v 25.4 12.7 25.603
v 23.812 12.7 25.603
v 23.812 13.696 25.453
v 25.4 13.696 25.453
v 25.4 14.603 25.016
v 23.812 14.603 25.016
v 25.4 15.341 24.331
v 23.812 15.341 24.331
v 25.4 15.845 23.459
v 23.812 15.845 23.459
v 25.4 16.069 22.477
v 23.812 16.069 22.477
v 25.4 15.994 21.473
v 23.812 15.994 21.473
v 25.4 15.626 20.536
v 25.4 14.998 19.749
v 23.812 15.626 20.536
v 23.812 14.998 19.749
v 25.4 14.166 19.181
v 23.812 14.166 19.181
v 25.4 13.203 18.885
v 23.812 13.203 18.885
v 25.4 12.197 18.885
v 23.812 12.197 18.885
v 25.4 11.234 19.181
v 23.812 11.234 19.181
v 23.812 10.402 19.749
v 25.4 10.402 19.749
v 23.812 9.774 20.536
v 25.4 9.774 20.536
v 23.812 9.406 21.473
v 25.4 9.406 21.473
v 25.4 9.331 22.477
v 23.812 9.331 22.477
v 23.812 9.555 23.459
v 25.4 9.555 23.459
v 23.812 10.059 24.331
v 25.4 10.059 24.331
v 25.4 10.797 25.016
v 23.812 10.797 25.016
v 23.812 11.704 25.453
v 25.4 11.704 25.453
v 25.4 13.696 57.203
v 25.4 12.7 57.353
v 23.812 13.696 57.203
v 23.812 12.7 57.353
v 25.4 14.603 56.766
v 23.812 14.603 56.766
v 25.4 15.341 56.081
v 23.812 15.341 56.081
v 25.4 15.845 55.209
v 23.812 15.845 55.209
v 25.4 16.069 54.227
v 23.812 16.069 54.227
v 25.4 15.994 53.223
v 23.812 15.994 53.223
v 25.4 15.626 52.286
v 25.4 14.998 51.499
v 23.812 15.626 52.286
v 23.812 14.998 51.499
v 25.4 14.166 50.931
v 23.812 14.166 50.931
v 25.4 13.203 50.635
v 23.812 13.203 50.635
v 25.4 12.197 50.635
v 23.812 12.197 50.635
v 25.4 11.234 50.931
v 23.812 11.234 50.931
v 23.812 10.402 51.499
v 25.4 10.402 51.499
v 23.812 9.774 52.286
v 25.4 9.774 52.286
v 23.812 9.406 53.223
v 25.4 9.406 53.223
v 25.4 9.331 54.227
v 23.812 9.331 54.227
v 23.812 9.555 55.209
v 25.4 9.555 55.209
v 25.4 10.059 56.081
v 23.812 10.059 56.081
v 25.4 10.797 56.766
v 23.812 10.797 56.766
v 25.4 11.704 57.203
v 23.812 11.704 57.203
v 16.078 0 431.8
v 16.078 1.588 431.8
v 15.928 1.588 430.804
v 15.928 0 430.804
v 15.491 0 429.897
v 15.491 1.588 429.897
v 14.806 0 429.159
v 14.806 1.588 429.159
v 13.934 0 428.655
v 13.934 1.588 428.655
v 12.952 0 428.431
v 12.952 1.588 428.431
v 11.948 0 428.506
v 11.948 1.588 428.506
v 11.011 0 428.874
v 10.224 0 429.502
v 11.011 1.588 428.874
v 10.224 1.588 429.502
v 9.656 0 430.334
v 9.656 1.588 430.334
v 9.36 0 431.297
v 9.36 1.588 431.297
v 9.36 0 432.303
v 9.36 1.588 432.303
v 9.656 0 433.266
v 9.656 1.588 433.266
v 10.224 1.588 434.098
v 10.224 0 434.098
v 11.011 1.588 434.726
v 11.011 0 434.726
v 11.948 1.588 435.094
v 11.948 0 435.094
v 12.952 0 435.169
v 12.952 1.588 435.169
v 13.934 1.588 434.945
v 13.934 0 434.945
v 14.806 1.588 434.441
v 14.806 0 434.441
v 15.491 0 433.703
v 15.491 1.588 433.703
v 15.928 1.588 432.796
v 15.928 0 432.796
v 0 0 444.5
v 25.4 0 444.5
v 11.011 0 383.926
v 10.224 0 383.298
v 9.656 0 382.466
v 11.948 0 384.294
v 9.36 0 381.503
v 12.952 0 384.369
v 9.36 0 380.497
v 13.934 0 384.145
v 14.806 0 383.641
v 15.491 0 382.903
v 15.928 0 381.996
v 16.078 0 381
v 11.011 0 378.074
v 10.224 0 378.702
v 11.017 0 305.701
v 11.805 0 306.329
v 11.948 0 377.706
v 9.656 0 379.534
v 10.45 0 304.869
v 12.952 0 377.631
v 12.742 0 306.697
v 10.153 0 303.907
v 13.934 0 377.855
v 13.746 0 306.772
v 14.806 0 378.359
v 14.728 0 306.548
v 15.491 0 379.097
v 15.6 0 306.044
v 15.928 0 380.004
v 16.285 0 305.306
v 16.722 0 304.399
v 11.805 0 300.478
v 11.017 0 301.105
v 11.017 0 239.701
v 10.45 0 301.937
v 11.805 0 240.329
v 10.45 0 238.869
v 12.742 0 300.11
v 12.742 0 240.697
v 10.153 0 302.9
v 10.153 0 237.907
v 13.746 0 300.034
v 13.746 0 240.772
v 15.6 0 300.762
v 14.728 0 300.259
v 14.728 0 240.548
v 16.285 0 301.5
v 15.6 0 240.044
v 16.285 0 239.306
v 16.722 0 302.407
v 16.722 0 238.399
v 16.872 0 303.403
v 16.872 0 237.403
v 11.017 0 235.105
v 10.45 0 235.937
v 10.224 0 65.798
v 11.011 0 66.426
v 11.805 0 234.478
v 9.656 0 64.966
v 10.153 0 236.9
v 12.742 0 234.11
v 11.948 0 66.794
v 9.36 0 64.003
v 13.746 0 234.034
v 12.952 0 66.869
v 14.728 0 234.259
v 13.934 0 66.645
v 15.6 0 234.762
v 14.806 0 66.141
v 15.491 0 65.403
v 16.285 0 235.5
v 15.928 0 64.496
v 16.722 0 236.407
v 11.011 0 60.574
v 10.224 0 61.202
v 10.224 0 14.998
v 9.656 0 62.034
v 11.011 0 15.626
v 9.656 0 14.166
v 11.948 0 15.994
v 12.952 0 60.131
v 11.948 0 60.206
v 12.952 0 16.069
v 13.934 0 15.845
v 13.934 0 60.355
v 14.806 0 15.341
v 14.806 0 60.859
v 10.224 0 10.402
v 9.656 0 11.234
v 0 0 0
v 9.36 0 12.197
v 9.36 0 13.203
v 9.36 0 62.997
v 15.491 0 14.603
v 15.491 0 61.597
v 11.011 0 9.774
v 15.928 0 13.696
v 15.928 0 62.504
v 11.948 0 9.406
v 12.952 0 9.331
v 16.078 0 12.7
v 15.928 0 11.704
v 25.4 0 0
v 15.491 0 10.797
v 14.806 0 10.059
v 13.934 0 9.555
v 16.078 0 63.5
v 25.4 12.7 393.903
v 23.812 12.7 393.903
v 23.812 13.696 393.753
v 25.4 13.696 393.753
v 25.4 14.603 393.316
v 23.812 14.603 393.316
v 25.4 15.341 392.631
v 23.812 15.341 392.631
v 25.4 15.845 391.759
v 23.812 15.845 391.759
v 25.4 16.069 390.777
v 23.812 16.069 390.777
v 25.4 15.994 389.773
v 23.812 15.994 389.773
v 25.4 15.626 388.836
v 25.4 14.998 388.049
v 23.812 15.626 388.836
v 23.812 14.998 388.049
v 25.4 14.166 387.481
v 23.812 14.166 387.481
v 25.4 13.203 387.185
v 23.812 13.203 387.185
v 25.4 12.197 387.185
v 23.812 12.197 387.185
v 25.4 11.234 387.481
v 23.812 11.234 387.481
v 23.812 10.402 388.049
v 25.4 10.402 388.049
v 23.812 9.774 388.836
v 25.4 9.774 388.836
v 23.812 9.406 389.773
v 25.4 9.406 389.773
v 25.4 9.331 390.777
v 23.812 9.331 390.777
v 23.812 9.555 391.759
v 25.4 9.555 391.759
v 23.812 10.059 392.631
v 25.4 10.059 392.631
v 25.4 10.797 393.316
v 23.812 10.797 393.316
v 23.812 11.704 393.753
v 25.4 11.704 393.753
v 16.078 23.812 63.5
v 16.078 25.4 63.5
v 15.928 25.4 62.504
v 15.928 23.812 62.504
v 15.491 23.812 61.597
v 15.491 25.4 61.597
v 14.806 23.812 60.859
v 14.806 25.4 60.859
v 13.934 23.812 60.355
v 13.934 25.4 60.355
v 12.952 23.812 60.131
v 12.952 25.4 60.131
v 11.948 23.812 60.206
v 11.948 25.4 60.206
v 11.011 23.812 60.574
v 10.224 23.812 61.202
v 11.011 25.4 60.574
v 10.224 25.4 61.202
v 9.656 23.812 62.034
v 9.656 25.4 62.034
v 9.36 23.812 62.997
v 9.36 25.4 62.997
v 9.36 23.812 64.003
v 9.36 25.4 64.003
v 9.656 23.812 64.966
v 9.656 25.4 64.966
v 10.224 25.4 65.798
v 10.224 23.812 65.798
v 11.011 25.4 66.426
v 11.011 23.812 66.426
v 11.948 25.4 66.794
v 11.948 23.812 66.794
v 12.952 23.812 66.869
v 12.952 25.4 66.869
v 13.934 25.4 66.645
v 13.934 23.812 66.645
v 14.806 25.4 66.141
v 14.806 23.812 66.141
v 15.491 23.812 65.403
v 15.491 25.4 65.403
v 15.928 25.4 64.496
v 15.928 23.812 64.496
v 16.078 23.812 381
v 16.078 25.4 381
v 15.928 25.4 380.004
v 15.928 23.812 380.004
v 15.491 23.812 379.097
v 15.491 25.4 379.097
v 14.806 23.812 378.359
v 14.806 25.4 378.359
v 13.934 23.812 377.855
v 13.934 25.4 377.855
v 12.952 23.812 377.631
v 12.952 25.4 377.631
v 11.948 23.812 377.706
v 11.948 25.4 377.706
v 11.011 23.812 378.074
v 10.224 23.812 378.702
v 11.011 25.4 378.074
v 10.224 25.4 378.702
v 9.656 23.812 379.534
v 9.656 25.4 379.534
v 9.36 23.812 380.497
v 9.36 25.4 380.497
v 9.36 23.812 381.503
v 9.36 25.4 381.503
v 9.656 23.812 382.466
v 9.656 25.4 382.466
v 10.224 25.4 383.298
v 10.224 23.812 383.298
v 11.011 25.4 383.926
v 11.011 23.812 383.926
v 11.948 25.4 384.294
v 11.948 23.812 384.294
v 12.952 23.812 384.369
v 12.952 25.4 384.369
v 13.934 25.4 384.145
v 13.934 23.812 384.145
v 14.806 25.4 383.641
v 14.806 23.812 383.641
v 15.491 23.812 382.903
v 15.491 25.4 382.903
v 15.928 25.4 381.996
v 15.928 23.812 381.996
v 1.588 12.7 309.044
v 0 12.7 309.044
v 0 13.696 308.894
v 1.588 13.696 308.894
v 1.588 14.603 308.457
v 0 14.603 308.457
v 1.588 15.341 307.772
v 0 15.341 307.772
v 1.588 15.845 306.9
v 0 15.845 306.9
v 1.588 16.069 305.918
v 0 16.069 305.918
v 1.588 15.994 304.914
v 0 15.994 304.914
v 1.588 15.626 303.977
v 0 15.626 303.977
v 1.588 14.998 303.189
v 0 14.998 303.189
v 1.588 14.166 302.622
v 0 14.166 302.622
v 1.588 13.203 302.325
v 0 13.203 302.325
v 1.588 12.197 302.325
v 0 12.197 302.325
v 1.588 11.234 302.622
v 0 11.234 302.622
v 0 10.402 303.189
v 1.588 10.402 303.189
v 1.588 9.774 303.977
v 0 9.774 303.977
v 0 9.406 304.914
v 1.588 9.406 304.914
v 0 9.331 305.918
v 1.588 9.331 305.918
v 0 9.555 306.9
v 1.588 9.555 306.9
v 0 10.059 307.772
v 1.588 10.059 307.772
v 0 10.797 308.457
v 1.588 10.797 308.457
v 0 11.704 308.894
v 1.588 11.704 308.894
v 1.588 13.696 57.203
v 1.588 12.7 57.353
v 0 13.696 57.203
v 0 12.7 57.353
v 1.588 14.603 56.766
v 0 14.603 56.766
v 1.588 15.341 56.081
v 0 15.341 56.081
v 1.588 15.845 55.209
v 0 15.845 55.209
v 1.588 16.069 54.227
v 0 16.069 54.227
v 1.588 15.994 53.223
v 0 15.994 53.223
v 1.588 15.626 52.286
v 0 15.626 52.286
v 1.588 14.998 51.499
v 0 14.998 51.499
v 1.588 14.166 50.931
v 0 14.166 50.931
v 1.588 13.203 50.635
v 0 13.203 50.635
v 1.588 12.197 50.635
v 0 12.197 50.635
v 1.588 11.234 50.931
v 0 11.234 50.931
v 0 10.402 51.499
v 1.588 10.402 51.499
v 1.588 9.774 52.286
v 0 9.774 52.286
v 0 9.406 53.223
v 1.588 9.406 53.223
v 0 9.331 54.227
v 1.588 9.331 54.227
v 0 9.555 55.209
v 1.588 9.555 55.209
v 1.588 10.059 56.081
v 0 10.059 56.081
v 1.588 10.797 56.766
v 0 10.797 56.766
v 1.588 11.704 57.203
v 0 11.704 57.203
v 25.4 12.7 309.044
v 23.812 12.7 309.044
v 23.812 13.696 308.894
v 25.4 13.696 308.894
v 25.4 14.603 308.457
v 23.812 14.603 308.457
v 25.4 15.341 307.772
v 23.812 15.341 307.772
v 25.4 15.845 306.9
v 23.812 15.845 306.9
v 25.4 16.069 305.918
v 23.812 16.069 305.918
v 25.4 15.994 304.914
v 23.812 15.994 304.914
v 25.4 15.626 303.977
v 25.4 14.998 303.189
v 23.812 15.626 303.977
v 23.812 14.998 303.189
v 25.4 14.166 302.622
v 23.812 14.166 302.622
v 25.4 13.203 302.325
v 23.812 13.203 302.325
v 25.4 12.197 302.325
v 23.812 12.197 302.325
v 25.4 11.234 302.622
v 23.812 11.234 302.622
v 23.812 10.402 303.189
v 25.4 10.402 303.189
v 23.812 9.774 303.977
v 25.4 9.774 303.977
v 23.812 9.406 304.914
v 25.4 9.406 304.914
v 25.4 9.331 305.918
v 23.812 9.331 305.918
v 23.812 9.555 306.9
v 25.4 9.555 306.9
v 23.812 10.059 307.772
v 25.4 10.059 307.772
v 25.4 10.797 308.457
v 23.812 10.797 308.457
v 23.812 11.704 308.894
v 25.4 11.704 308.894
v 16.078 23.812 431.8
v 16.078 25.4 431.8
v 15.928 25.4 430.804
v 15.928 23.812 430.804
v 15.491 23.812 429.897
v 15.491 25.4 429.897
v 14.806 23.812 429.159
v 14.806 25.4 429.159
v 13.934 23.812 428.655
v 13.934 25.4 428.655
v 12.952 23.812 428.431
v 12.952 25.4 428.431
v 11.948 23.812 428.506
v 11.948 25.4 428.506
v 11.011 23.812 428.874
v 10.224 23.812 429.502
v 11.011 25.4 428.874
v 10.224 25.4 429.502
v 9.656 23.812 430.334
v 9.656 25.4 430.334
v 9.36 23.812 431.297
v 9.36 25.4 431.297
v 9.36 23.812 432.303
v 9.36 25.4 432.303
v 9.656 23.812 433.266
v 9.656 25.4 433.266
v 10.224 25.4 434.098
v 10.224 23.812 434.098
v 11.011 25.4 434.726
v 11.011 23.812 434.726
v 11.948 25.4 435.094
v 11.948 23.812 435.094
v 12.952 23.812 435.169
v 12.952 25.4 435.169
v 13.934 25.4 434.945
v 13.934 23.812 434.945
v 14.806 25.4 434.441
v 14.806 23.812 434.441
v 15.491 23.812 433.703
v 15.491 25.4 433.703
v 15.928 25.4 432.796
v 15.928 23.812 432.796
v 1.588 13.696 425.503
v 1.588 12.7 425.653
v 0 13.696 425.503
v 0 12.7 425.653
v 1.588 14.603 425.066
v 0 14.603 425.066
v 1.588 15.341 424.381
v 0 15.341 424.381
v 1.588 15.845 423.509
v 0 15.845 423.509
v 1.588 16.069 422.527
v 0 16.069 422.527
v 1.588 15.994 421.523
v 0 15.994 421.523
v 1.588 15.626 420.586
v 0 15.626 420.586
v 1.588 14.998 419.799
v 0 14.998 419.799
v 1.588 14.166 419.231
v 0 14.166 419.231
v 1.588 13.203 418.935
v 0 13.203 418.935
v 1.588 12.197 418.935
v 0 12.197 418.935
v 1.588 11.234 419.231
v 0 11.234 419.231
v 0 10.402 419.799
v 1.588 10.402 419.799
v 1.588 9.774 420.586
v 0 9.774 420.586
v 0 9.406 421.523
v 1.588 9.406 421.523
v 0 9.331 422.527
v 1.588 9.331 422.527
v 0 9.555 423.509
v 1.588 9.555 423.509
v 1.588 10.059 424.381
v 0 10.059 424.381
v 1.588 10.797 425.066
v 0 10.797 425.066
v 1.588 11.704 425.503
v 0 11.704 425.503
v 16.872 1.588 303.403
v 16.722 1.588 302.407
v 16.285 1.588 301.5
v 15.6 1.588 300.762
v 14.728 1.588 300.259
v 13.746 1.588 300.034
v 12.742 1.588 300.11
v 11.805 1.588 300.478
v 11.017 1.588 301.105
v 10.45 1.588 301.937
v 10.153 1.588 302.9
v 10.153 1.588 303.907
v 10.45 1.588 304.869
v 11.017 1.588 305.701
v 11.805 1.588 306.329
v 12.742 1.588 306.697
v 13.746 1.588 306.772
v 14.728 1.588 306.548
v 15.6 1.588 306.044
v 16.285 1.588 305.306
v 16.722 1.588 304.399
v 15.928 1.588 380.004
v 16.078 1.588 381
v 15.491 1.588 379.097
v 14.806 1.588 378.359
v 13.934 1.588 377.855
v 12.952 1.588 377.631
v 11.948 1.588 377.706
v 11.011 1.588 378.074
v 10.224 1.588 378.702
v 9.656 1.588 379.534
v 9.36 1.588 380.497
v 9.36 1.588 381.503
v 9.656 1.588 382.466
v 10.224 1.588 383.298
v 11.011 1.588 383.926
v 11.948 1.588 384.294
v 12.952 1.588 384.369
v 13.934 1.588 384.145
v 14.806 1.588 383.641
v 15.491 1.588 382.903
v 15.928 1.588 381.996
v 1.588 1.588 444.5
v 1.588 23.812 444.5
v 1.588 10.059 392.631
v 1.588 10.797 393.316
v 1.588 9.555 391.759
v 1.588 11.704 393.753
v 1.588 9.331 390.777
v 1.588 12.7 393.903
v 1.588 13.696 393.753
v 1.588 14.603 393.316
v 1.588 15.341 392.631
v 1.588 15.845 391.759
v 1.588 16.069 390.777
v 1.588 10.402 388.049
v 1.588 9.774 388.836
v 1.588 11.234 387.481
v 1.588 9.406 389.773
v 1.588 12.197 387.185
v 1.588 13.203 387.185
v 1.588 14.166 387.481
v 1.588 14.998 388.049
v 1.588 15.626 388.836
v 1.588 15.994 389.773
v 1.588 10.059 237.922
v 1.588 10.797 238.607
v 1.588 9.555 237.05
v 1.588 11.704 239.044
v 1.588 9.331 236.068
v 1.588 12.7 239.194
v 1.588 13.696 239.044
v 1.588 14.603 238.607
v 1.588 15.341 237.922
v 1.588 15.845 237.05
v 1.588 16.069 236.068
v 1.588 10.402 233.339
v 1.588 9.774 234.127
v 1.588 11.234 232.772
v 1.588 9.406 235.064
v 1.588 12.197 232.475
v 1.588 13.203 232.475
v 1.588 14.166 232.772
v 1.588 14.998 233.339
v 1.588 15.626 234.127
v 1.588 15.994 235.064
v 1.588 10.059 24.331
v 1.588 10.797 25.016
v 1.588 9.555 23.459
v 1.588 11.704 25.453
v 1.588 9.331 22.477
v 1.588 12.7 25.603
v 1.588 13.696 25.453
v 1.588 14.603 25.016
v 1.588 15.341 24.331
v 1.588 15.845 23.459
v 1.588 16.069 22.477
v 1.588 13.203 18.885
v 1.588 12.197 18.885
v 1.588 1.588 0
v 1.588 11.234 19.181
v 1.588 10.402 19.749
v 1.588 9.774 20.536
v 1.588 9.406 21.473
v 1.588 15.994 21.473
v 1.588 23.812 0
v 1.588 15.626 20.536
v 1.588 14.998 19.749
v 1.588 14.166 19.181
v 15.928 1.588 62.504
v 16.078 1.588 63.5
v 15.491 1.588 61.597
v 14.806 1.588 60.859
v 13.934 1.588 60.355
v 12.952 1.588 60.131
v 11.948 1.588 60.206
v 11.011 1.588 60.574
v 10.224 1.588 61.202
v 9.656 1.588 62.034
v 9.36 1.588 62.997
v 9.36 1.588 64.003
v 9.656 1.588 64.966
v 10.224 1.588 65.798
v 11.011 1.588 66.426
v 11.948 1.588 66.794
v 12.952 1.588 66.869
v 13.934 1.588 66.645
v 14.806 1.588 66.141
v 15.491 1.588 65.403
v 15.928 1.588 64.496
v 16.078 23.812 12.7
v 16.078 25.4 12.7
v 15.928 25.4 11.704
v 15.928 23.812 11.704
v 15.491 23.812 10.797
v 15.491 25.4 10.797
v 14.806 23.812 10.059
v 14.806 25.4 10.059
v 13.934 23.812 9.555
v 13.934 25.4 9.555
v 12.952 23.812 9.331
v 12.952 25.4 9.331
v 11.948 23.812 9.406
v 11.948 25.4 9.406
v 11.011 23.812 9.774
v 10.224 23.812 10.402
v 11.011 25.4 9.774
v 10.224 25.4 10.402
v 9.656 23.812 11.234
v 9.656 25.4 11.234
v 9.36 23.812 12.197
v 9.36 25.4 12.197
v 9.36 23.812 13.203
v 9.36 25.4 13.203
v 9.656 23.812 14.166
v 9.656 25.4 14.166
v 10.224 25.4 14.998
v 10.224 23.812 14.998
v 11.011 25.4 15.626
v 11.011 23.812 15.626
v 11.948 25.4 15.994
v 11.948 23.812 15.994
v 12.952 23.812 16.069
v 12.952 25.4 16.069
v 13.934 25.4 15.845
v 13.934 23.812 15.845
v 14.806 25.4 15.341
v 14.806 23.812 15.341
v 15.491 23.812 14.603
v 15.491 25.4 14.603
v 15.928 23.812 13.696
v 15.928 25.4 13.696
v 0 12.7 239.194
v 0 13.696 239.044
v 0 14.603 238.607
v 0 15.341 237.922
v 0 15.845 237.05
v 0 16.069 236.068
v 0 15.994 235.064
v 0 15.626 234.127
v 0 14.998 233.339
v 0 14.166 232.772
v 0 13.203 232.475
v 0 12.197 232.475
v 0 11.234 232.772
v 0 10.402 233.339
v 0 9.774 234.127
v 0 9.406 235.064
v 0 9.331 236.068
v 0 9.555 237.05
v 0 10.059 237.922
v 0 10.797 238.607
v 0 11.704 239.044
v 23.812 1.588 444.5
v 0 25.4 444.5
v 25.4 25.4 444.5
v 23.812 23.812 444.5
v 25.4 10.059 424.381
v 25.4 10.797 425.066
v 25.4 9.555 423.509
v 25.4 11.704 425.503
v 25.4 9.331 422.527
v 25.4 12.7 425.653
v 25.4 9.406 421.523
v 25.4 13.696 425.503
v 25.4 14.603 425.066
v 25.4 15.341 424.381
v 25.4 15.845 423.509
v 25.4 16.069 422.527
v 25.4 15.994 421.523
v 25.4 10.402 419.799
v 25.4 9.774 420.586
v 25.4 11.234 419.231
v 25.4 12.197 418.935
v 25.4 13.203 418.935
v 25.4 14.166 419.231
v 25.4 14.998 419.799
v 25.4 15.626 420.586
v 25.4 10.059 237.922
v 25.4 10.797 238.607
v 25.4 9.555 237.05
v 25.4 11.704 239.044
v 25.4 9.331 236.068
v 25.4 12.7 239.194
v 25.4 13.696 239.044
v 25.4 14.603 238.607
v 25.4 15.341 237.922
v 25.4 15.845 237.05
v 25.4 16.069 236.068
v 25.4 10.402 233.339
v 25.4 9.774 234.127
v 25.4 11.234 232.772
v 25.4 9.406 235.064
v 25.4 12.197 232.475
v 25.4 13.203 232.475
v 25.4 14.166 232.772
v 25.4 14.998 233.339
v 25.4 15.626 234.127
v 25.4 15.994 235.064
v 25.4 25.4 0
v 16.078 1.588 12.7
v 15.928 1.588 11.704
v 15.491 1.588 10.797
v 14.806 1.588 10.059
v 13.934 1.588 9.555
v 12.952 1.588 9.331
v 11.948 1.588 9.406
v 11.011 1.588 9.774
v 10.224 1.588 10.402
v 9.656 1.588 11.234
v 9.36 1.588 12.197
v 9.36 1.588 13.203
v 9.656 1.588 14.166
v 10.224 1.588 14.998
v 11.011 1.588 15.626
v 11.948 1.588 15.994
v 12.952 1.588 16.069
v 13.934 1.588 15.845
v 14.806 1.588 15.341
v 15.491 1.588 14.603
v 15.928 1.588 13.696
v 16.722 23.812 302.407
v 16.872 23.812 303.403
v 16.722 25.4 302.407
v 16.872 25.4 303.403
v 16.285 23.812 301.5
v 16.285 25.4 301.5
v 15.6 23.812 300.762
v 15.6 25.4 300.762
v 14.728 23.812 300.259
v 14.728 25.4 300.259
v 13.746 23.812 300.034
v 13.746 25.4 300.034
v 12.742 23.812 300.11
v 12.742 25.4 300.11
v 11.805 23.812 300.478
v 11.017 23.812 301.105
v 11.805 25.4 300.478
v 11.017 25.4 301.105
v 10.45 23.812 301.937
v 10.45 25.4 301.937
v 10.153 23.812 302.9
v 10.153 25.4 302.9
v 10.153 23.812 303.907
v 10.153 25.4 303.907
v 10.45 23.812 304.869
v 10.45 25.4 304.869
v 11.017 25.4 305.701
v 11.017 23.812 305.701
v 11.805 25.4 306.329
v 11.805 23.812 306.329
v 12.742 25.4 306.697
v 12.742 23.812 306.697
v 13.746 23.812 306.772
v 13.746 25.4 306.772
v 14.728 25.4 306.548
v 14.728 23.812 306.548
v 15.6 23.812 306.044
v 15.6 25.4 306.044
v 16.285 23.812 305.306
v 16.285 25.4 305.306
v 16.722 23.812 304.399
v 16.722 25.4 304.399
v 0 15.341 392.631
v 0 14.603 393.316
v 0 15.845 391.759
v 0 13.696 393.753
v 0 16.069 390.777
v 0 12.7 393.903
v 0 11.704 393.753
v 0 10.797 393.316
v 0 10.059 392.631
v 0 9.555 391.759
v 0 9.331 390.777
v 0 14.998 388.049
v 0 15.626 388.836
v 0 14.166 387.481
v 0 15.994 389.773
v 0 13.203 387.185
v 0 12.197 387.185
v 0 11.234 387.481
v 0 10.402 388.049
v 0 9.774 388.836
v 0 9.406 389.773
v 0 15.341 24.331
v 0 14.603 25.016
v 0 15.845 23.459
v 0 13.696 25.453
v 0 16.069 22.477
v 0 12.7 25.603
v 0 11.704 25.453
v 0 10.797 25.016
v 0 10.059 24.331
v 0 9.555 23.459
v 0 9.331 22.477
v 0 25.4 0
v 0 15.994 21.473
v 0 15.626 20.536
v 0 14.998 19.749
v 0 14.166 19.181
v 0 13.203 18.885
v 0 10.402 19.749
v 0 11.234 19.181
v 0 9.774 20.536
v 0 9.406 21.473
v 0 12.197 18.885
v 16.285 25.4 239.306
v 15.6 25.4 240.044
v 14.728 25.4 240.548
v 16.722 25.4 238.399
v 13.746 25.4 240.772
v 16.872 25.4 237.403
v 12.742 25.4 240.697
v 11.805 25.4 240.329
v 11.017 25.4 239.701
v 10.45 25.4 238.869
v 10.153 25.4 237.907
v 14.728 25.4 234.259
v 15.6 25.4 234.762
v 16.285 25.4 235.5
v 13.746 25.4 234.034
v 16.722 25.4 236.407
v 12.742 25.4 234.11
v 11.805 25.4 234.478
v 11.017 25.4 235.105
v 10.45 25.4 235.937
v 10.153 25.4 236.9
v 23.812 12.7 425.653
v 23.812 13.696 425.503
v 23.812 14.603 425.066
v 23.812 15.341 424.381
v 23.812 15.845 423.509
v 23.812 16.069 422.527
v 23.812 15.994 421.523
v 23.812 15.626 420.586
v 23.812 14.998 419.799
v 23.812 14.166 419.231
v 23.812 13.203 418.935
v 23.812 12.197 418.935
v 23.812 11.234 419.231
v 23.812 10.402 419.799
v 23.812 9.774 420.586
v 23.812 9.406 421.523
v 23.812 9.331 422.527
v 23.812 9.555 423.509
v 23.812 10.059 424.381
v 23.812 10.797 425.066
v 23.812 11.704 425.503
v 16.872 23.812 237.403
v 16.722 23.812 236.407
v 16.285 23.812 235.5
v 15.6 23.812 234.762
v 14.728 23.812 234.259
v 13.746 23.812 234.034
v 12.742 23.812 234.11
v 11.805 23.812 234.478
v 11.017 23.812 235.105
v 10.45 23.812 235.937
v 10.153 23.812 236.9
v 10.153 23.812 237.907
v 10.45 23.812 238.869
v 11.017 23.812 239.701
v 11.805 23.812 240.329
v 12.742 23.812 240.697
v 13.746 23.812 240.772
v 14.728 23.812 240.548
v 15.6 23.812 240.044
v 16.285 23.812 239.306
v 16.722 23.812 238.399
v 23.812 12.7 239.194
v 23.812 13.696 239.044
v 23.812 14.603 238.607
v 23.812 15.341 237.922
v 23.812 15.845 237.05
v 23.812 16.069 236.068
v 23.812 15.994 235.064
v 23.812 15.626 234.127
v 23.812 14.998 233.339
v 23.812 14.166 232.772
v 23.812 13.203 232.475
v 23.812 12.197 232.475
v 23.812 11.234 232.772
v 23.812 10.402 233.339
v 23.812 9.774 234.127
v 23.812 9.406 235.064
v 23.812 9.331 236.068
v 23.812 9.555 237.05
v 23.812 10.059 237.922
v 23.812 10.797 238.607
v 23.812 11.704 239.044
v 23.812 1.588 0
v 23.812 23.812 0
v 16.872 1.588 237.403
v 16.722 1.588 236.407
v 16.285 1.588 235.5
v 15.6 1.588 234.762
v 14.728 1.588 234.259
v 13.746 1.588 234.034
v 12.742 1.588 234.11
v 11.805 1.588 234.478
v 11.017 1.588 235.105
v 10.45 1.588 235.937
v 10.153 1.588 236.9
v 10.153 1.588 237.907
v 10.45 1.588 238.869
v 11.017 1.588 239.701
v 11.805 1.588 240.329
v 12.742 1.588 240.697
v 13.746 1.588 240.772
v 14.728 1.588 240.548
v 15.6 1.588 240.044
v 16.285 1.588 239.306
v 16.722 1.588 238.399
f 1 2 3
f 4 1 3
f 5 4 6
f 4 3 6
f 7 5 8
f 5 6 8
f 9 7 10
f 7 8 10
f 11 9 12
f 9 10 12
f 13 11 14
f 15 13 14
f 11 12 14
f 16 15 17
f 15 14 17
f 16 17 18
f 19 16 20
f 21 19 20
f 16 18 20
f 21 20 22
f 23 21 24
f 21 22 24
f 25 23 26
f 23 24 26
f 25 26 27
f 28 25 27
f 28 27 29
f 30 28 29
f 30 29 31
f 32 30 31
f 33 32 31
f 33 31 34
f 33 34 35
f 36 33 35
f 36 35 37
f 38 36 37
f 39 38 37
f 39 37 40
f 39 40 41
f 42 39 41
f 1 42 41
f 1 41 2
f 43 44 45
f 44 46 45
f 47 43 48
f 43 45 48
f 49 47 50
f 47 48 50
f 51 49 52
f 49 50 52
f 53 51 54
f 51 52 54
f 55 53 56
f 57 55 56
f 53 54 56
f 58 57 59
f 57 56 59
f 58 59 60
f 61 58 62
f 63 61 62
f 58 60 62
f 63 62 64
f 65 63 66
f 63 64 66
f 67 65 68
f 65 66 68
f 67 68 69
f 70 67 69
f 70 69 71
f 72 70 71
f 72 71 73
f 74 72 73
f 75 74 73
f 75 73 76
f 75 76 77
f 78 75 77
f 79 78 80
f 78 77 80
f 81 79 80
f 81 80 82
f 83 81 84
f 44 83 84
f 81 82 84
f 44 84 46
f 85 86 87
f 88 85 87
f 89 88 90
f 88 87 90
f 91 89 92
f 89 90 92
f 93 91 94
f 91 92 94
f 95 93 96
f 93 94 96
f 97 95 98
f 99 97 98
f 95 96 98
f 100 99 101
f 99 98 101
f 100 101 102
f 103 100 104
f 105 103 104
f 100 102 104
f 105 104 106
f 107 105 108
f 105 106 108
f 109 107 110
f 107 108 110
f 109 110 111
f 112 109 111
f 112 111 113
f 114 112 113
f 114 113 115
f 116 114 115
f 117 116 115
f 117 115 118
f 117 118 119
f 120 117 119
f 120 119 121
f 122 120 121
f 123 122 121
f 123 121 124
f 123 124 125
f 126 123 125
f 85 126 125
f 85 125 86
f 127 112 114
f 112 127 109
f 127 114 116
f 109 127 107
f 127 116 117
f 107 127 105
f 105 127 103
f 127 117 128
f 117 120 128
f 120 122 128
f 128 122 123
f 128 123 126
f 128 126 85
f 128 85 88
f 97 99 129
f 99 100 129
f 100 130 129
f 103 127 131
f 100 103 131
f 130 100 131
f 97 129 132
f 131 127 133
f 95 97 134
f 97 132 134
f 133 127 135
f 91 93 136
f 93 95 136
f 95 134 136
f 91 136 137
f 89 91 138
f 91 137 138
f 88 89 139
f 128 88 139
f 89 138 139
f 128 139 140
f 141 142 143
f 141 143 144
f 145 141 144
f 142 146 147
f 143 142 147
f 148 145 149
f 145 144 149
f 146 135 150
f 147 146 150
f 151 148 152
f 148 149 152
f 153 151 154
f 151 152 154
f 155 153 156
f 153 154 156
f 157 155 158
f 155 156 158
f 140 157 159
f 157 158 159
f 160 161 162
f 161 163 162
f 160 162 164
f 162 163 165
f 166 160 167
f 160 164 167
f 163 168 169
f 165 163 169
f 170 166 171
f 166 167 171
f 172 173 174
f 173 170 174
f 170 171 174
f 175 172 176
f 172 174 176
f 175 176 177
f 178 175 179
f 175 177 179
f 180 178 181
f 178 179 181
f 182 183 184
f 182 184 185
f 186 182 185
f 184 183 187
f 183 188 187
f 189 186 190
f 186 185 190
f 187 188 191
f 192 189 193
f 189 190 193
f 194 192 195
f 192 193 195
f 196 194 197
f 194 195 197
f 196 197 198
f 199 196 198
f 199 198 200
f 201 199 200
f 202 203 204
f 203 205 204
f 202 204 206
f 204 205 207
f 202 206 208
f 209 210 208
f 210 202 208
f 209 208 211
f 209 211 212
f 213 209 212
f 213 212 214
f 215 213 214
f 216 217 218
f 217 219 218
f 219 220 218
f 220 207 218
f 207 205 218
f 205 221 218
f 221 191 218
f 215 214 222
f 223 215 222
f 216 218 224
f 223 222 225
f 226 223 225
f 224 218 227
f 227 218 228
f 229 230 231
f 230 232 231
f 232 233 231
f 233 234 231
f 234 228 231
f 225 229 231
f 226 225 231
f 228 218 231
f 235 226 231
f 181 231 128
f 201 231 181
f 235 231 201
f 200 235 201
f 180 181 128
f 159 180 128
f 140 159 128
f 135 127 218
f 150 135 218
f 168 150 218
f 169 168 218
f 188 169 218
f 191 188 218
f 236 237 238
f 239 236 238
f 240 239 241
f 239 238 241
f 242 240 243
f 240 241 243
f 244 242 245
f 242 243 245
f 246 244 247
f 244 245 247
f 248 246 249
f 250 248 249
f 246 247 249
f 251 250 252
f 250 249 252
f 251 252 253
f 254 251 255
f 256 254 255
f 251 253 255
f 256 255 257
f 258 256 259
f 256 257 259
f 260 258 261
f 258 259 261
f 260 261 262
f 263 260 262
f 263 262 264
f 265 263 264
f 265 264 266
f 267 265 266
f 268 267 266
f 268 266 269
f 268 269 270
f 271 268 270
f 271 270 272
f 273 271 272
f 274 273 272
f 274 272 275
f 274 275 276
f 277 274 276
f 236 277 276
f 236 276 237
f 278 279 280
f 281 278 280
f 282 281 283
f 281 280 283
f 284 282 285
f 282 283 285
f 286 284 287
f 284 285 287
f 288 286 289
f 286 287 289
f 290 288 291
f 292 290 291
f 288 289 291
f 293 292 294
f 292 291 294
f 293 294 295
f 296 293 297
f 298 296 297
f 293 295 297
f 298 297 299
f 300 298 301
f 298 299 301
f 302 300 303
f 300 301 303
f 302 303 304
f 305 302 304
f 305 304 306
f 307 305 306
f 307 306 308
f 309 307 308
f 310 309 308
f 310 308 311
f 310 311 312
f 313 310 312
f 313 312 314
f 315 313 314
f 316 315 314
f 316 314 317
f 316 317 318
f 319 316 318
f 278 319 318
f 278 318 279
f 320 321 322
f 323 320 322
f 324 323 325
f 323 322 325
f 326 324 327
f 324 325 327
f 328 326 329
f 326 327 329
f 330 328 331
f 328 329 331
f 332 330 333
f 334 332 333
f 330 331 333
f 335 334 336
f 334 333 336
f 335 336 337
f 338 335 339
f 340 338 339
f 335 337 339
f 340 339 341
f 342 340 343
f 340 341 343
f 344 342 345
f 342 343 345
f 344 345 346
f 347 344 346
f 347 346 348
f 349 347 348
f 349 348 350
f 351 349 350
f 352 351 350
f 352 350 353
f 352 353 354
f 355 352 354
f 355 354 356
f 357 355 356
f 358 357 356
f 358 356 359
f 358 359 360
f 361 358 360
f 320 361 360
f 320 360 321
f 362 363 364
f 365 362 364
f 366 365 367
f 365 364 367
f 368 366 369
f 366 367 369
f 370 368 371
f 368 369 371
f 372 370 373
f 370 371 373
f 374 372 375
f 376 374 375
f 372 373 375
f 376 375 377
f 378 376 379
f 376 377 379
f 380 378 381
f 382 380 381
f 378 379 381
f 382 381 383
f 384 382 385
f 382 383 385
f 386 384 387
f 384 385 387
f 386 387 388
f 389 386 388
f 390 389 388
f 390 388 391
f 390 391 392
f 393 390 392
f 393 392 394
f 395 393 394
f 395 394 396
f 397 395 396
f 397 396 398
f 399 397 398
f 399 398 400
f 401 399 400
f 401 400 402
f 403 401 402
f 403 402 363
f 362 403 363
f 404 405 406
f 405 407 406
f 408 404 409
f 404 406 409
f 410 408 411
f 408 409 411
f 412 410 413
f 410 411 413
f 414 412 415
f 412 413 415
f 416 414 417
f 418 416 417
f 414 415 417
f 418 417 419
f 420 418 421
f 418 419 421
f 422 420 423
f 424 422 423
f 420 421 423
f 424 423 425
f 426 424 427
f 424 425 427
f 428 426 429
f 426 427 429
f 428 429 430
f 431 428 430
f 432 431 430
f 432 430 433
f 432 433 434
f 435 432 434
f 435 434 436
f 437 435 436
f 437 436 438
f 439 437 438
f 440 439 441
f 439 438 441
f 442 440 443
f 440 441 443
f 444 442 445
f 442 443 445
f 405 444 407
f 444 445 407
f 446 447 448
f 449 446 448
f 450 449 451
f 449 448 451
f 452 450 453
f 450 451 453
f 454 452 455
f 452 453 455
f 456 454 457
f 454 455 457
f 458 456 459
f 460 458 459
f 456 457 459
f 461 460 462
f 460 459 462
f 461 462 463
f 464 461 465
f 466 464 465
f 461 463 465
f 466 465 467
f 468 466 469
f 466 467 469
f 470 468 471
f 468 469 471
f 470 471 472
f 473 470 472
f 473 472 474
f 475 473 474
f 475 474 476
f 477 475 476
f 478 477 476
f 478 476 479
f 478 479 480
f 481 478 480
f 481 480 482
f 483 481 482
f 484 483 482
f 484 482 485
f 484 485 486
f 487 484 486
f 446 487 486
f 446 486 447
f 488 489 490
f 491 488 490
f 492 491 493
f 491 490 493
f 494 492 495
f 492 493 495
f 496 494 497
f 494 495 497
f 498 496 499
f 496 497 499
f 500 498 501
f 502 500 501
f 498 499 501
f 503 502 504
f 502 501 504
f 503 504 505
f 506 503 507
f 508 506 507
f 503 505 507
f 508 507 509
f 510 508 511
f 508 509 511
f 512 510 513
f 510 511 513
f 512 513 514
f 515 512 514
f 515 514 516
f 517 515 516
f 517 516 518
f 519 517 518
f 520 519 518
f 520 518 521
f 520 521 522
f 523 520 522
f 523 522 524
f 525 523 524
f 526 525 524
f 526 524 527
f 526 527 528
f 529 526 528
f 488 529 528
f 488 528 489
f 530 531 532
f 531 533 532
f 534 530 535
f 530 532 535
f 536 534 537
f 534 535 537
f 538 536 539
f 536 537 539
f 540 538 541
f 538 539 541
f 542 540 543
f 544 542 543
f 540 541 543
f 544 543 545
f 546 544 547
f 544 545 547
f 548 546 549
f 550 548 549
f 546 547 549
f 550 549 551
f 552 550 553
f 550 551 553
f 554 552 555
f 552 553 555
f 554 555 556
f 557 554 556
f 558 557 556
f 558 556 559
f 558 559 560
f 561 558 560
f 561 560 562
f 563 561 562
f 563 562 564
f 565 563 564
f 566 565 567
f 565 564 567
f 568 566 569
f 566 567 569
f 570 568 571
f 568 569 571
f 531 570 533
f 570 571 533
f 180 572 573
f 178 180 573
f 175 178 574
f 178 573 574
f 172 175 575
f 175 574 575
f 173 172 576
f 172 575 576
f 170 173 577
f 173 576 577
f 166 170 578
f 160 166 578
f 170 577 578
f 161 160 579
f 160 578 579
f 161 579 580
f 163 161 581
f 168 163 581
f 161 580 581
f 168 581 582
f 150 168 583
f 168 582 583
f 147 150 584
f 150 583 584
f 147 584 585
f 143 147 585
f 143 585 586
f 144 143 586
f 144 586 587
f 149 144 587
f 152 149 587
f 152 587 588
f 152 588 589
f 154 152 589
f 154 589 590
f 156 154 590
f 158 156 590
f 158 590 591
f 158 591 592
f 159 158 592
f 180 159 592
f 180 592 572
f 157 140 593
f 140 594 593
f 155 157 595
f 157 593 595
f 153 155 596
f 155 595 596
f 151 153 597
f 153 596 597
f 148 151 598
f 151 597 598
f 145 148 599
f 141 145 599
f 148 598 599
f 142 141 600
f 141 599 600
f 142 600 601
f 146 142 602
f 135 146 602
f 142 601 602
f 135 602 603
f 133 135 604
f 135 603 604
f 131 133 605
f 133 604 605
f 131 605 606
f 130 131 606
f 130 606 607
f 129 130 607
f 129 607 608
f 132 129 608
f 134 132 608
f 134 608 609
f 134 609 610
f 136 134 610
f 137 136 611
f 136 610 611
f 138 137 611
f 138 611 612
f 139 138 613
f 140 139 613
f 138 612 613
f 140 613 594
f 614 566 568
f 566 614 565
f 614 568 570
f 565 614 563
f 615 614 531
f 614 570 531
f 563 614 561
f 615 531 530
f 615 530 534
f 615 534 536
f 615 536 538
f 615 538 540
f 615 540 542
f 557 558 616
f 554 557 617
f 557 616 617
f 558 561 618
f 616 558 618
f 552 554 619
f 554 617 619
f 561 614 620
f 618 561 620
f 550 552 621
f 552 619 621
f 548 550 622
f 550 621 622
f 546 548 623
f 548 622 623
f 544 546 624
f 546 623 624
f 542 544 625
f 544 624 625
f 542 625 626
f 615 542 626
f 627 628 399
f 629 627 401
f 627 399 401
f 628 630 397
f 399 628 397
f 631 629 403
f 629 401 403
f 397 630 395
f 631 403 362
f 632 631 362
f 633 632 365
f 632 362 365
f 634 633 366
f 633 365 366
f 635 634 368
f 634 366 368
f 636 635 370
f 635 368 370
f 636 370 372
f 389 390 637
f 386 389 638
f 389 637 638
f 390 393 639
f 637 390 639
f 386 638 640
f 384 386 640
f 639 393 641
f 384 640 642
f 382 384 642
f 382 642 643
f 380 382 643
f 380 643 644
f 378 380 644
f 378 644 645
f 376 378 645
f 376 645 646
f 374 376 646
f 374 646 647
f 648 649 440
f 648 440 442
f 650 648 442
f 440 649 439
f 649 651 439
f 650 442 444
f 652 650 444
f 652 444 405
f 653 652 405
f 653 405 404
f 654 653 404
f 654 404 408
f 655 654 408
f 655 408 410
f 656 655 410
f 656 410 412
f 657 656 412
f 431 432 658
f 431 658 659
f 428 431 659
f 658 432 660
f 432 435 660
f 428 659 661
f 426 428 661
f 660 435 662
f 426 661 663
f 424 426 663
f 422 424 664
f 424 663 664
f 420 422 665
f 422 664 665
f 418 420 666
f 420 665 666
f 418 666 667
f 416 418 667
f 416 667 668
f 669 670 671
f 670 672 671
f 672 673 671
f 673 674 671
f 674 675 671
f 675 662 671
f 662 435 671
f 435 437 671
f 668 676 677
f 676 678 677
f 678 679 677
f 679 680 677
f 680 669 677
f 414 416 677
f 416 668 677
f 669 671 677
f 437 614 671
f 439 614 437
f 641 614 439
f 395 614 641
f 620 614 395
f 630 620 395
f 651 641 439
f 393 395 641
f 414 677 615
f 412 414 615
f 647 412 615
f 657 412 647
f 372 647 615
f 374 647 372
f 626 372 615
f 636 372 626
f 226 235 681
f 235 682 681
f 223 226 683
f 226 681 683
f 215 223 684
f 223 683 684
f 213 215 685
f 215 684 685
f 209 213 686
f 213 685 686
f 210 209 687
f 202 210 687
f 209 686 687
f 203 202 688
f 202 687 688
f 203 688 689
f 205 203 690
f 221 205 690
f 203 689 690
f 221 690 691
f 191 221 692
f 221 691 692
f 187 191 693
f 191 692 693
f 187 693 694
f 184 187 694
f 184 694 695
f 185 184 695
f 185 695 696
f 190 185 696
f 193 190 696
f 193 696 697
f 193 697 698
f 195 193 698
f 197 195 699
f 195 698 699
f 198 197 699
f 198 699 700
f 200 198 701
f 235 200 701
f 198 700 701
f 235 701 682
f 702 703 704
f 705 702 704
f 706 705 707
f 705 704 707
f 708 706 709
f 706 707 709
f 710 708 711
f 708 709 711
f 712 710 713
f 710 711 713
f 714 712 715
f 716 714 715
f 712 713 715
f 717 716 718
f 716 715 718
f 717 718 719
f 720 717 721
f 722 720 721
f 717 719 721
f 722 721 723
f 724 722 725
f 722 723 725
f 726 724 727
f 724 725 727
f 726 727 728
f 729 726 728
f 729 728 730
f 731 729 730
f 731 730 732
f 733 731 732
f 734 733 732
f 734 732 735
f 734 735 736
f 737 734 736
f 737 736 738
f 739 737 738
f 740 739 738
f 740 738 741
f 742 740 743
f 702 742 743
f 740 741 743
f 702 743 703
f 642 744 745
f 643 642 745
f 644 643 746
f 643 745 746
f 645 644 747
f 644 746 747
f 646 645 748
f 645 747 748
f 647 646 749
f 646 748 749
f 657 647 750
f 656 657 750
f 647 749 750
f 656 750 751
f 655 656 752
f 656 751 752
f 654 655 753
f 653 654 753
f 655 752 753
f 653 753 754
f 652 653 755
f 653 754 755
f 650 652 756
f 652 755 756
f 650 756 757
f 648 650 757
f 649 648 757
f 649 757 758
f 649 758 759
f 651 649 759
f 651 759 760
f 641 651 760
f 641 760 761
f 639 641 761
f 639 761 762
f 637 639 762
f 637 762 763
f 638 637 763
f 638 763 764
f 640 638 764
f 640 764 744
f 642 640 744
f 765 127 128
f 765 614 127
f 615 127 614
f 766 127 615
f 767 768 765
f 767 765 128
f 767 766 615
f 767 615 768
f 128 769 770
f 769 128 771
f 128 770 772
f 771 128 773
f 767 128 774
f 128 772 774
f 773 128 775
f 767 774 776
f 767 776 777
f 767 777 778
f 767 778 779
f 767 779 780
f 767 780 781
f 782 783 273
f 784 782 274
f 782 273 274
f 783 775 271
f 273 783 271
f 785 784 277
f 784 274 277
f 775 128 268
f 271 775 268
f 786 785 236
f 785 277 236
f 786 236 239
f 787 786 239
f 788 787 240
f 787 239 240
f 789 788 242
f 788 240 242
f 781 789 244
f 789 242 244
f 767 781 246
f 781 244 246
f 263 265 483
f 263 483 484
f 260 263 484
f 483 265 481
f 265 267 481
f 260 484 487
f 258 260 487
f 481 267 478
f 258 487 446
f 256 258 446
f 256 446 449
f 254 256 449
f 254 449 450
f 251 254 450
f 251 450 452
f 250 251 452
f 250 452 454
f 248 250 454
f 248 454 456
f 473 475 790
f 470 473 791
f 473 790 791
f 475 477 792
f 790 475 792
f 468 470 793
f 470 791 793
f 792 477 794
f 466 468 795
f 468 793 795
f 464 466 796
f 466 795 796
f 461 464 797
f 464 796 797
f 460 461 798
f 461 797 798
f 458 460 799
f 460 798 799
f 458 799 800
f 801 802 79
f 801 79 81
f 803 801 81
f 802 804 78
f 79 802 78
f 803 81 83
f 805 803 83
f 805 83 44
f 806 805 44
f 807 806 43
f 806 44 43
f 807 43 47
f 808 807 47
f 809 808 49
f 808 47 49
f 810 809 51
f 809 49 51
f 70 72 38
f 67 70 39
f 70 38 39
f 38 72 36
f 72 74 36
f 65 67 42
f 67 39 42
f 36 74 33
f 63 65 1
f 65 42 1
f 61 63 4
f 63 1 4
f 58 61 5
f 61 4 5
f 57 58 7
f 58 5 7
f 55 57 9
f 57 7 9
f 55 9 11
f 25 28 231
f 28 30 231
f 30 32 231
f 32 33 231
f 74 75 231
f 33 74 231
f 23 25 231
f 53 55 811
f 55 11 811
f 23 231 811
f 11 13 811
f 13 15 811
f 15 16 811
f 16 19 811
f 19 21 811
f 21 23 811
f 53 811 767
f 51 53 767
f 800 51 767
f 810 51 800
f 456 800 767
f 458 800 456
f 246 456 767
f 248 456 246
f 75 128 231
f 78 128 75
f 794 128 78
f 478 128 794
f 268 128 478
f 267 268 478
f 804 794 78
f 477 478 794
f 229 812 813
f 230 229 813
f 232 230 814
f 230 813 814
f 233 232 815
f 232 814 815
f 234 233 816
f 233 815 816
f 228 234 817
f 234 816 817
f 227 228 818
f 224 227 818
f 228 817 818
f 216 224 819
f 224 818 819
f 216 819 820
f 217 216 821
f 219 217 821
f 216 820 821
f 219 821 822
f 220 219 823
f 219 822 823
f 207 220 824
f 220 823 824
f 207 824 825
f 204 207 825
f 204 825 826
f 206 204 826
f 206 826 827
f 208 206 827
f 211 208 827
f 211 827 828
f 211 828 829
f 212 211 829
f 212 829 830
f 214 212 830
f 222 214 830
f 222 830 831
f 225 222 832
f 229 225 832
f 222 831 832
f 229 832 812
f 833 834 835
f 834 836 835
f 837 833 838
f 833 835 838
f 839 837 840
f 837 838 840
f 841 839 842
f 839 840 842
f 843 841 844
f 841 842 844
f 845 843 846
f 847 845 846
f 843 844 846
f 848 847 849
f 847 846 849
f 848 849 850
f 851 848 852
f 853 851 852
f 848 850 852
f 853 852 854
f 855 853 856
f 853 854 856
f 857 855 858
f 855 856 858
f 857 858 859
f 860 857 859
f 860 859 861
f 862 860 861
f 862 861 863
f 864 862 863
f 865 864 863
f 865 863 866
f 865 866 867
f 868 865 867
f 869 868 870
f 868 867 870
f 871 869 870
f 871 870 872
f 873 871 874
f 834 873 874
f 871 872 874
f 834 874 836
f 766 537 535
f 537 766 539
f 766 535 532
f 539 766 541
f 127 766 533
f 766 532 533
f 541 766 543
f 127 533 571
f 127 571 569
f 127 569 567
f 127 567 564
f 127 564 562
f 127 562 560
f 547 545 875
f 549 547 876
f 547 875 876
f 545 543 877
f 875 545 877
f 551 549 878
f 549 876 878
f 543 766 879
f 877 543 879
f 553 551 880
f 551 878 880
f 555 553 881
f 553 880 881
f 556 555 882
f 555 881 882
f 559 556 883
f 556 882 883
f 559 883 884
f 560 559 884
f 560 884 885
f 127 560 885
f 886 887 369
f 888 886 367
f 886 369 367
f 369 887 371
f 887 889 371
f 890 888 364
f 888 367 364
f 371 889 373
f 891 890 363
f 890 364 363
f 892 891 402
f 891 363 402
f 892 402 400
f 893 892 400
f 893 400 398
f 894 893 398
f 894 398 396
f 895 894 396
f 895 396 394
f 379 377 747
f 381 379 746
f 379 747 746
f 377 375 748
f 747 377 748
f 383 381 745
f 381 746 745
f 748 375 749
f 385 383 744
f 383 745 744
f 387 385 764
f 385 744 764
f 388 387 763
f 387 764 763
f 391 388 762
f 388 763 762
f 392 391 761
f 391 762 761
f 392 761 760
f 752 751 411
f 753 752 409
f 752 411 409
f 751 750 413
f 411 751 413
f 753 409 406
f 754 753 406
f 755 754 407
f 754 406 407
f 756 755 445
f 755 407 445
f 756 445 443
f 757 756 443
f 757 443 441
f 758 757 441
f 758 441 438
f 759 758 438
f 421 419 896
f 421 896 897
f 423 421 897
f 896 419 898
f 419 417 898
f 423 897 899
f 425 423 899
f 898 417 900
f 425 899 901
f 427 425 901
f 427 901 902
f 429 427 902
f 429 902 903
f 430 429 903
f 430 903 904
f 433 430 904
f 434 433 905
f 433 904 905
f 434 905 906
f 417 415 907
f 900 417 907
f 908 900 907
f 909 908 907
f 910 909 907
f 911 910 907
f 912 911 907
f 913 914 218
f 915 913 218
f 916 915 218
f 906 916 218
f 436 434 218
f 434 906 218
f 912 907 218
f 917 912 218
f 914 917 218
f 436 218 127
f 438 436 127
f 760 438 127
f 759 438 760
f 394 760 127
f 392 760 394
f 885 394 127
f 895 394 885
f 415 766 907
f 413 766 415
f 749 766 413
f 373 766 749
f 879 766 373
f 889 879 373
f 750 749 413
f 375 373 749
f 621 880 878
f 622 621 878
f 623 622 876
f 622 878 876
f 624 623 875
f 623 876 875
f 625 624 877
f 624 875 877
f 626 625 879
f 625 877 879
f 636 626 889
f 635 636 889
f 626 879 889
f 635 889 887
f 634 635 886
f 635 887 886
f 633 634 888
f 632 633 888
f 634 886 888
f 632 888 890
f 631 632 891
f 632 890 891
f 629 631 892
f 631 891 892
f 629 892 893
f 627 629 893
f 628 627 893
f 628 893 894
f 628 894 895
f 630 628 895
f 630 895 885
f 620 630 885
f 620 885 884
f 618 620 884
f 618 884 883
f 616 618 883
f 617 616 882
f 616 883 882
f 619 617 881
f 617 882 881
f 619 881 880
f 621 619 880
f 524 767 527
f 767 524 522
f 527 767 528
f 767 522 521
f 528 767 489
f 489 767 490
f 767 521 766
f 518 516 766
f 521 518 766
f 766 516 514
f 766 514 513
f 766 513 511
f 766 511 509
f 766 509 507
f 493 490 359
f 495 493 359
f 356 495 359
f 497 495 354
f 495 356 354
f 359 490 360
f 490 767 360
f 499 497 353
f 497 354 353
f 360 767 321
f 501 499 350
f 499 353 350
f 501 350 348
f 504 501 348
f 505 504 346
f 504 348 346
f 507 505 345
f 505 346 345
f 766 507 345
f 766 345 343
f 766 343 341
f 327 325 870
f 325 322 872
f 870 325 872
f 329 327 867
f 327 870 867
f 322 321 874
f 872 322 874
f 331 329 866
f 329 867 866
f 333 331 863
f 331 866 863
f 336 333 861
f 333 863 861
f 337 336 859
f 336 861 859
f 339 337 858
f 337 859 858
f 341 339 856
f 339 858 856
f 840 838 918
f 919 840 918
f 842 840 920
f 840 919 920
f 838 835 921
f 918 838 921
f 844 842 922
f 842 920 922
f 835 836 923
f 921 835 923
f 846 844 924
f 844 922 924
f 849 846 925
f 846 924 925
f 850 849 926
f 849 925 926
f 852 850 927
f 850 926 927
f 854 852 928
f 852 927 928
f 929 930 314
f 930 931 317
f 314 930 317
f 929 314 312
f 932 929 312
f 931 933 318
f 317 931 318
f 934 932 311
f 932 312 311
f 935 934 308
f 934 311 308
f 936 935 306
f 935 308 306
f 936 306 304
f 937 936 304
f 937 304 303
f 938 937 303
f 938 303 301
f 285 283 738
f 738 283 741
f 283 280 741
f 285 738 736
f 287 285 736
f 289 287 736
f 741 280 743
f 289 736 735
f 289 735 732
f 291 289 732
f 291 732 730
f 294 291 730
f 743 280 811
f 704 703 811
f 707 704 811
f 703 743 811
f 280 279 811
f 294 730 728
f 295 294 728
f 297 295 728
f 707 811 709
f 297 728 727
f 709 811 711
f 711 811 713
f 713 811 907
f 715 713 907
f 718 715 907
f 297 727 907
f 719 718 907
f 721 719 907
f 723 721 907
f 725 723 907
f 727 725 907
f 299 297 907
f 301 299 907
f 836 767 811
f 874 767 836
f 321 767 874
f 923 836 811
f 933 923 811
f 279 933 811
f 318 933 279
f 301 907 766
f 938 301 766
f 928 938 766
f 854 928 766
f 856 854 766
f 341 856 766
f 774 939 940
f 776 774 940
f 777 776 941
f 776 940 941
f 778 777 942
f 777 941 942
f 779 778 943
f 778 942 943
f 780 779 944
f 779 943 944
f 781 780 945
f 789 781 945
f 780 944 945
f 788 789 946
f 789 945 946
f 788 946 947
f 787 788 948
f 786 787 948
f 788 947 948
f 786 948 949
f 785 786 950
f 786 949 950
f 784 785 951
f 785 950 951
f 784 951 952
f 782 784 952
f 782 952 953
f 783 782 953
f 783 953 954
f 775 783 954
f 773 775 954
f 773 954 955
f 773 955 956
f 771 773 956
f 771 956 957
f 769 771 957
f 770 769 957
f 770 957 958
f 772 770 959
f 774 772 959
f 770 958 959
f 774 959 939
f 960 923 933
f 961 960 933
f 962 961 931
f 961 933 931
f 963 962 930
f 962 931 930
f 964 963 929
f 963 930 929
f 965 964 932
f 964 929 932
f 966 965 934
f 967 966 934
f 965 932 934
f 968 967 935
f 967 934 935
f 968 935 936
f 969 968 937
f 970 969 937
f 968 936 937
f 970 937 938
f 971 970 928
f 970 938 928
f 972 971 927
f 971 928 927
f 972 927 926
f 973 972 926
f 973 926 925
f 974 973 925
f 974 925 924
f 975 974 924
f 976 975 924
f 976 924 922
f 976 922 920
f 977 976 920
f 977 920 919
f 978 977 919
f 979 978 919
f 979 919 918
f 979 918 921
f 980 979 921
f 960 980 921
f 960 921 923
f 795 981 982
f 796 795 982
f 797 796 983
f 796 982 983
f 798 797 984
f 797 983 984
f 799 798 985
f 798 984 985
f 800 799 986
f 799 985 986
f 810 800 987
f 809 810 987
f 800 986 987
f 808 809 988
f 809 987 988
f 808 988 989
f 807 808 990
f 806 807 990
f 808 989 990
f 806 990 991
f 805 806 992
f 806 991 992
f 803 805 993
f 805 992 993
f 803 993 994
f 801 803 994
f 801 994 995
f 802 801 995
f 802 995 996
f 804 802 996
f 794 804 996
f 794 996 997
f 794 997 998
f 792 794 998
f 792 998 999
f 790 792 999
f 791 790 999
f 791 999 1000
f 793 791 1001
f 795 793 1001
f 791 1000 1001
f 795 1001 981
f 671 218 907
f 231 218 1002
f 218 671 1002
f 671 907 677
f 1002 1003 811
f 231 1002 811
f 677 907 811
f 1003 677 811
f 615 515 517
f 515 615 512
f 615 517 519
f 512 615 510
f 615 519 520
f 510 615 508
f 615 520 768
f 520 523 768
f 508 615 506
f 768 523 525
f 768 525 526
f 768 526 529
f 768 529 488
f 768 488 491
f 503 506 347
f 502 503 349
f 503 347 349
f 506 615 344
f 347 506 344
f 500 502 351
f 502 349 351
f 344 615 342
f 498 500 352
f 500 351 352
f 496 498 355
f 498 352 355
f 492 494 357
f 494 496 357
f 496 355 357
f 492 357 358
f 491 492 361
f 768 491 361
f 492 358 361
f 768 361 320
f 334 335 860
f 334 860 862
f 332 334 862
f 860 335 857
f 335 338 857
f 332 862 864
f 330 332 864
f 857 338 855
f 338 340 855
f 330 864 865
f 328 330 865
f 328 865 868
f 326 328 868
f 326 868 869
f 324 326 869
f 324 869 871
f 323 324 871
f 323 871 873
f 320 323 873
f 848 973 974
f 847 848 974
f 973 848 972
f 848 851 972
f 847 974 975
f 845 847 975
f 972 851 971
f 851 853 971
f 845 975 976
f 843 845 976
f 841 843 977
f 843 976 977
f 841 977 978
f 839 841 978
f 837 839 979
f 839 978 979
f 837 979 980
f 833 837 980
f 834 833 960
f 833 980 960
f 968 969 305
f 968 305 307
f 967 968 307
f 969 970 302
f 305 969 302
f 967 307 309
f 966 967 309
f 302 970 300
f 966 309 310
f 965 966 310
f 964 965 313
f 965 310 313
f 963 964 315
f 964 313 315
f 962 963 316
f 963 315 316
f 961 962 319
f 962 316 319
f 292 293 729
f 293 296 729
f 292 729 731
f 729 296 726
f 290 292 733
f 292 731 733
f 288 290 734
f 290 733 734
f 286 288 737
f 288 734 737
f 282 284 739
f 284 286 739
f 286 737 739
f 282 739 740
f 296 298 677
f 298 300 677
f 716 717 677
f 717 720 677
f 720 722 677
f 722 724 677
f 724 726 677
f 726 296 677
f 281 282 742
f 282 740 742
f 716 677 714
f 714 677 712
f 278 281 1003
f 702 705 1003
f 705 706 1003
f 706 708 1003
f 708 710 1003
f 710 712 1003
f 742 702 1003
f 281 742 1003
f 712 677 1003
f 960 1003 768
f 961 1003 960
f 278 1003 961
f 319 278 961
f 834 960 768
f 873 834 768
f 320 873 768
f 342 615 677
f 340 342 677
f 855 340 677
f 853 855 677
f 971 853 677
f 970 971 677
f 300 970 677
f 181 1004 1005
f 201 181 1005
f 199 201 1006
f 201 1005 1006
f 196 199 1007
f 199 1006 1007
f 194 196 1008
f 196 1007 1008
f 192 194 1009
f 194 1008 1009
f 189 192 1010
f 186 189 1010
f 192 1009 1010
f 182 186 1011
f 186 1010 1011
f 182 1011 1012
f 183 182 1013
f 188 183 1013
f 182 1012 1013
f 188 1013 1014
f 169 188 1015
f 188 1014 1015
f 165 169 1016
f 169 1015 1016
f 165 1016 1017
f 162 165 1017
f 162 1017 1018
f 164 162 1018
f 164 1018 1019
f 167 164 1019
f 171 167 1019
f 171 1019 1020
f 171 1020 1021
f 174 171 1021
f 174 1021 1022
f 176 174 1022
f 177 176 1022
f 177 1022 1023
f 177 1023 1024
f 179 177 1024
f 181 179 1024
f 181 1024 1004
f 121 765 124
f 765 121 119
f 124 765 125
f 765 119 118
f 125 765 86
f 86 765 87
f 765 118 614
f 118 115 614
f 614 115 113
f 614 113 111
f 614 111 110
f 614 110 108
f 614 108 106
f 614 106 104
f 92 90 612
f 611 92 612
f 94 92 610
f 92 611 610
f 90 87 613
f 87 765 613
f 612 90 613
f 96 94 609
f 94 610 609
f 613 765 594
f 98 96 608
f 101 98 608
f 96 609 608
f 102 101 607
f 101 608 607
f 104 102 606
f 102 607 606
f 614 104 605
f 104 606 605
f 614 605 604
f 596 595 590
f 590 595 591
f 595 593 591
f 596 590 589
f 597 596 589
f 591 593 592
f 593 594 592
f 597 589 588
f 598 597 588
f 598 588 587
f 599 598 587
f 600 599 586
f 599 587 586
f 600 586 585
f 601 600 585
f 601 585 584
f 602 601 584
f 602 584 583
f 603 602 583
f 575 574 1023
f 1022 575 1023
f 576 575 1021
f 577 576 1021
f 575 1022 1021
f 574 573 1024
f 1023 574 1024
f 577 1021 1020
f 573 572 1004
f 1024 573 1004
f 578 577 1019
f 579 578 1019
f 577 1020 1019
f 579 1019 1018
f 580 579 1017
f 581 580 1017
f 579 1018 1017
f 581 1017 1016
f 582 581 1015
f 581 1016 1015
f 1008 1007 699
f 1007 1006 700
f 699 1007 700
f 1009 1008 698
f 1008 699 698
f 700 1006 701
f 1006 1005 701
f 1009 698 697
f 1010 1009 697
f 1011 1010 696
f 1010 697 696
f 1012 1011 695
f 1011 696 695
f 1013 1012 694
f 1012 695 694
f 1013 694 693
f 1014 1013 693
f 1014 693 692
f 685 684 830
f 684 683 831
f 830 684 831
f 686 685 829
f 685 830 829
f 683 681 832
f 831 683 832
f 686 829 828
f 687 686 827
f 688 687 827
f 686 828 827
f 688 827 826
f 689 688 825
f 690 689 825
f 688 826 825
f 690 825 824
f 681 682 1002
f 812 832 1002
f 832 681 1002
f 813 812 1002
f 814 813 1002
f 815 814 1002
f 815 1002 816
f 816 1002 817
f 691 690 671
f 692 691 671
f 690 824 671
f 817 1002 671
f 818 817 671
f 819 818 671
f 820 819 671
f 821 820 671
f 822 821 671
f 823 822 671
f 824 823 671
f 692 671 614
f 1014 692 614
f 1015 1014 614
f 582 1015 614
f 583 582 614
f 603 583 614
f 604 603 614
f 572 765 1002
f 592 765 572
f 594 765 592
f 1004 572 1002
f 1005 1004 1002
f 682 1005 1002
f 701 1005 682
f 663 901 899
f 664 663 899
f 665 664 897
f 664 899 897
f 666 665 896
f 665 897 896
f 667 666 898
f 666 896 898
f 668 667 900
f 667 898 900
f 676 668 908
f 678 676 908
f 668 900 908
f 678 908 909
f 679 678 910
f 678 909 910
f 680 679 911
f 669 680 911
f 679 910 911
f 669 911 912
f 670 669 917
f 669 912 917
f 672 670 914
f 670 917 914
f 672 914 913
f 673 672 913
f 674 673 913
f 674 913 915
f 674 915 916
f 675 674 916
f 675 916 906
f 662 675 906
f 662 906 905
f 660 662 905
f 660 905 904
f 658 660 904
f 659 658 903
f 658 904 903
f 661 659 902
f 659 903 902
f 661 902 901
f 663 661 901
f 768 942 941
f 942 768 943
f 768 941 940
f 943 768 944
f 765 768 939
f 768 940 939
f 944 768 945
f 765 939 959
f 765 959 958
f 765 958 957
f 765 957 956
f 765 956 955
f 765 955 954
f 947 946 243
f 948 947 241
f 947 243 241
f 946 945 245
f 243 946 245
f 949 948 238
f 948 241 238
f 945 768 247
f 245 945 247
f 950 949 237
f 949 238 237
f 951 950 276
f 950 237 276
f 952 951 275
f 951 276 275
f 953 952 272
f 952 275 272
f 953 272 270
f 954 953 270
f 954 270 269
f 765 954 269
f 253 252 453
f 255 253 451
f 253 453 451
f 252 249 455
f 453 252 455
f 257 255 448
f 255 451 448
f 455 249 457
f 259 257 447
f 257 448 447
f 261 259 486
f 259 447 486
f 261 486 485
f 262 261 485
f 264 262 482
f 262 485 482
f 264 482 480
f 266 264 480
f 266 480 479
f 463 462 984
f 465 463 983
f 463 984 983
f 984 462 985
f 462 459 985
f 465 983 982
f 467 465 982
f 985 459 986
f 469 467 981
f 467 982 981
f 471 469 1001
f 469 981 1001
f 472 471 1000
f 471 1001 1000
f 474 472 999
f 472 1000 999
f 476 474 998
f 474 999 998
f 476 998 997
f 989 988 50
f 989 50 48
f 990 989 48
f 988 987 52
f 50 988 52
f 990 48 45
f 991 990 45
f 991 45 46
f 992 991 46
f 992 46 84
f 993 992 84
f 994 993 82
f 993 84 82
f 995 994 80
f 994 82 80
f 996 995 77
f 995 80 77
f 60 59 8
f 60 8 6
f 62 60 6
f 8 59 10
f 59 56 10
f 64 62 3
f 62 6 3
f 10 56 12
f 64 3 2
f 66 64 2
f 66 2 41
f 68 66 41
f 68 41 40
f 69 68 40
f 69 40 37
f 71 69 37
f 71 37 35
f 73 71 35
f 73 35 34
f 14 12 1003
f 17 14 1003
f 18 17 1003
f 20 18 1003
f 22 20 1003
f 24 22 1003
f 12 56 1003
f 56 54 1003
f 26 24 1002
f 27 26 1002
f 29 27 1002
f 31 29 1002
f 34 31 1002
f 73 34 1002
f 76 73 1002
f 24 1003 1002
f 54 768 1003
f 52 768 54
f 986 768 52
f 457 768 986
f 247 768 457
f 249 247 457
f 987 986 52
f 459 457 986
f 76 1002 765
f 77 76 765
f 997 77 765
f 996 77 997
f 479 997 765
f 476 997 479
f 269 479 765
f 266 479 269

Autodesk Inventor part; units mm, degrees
ref_plane "YZ Plane" through (0, 0, 0) normal (1, 0, 0) x (0, 1, 0)
ref_plane "XZ Plane" through (0, 0, 0) normal (0, 1, 0) x (-1, 0, 0)
ref_plane "XY Plane" through (0, 0, 0) normal (0, 0, 1) x (1, 0, 0)
sketch "Sketch1" plane through (0, 0, 0) normal (0, 0, 1) x (1, 0, 0)
  line L0 (0, 0) -> (25.4, 0)
  line L1 (25.4, 0) -> (25.4, 25.4)
  line L2 (25.4, 25.4) -> (0, 25.4)
  line L3 (0, 25.4) -> (0, 0)
  line L4 (1.5875, 23.8125) -> (23.8125, 23.8125)
  line L5 (23.8125, 23.8125) -> (23.8125, 1.5875)
  line L6 (23.8125, 1.5875) -> (1.5875, 1.5875)
  line L7 (1.5875, 1.5875) -> (1.5875, 23.8125)
  dimension "d0" = 25.4
  dimension "d1" = 25.4
  dimension "d2" = 1.5875
extrude "Extrusion1" add sketch "Sketch1" along normal blind 444.5
sketch "Sketch2" plane through (0, 25.4, 0) normal (0, 1, 0) x (1, 0, 0)
  line L0 (25.4, 0) -> (0, 0) projected
  line L1 (25.4, -444.5) -> (0, -444.5) projected
  circle A0 centre (12.7, -381) radius 3.3782 projected
  circle A1 centre (12.7, -431.8) radius 3.3782 projected
  circle A2 centre (13.4937, -237.4032) radius 3.3782 projected
  circle A3 centre (13.4937, -303.4032) radius 3.3782 projected
  line L2 (28.0987, -227.8782) -> (28.0987, -312.9282) construction
  line L3 (0.7937, -312.9282) -> (28.0987, -312.9282) construction
  line L4 (0.7937, -227.8782) -> (0.7937, -312.9282) projected
  line L5 (28.0987, -227.8782) -> (0.7937, -227.8782) construction
  circle A4 centre (12.7, -12.7) radius 3.3782 projected
  circle A5 centre (12.7, -63.5) radius 3.3782 projected
  line L6 (12.7, 0) -> (12.7, -444.5) construction
extrude "Extrusion2" cut sketch "Sketch2" against normal blind 25.4
sketch "Sketch3" plane through (0, 0, 0) normal (-1, 0, 0) x (0, 0, 1)
  circle A0 centre (422.275, 12.7) radius 3.3782 projected
  circle A1 centre (390.525, 12.7) radius 3.3782 projected
  circle A2 centre (305.6657, 12.7) radius 3.3782 projected
  circle A3 centre (235.8157, 12.7) radius 3.3782 projected
  circle A4 centre (53.975, 12.7) radius 3.3782 projected
  circle A5 centre (22.225, 12.7) radius 3.3782 projected
extrude "Extrusion3" cut sketch "Sketch3" against normal blind 25.4
properties part number "Rebuild Shooter Tower Motor Mount Tube" material "Aluminum 6061"
